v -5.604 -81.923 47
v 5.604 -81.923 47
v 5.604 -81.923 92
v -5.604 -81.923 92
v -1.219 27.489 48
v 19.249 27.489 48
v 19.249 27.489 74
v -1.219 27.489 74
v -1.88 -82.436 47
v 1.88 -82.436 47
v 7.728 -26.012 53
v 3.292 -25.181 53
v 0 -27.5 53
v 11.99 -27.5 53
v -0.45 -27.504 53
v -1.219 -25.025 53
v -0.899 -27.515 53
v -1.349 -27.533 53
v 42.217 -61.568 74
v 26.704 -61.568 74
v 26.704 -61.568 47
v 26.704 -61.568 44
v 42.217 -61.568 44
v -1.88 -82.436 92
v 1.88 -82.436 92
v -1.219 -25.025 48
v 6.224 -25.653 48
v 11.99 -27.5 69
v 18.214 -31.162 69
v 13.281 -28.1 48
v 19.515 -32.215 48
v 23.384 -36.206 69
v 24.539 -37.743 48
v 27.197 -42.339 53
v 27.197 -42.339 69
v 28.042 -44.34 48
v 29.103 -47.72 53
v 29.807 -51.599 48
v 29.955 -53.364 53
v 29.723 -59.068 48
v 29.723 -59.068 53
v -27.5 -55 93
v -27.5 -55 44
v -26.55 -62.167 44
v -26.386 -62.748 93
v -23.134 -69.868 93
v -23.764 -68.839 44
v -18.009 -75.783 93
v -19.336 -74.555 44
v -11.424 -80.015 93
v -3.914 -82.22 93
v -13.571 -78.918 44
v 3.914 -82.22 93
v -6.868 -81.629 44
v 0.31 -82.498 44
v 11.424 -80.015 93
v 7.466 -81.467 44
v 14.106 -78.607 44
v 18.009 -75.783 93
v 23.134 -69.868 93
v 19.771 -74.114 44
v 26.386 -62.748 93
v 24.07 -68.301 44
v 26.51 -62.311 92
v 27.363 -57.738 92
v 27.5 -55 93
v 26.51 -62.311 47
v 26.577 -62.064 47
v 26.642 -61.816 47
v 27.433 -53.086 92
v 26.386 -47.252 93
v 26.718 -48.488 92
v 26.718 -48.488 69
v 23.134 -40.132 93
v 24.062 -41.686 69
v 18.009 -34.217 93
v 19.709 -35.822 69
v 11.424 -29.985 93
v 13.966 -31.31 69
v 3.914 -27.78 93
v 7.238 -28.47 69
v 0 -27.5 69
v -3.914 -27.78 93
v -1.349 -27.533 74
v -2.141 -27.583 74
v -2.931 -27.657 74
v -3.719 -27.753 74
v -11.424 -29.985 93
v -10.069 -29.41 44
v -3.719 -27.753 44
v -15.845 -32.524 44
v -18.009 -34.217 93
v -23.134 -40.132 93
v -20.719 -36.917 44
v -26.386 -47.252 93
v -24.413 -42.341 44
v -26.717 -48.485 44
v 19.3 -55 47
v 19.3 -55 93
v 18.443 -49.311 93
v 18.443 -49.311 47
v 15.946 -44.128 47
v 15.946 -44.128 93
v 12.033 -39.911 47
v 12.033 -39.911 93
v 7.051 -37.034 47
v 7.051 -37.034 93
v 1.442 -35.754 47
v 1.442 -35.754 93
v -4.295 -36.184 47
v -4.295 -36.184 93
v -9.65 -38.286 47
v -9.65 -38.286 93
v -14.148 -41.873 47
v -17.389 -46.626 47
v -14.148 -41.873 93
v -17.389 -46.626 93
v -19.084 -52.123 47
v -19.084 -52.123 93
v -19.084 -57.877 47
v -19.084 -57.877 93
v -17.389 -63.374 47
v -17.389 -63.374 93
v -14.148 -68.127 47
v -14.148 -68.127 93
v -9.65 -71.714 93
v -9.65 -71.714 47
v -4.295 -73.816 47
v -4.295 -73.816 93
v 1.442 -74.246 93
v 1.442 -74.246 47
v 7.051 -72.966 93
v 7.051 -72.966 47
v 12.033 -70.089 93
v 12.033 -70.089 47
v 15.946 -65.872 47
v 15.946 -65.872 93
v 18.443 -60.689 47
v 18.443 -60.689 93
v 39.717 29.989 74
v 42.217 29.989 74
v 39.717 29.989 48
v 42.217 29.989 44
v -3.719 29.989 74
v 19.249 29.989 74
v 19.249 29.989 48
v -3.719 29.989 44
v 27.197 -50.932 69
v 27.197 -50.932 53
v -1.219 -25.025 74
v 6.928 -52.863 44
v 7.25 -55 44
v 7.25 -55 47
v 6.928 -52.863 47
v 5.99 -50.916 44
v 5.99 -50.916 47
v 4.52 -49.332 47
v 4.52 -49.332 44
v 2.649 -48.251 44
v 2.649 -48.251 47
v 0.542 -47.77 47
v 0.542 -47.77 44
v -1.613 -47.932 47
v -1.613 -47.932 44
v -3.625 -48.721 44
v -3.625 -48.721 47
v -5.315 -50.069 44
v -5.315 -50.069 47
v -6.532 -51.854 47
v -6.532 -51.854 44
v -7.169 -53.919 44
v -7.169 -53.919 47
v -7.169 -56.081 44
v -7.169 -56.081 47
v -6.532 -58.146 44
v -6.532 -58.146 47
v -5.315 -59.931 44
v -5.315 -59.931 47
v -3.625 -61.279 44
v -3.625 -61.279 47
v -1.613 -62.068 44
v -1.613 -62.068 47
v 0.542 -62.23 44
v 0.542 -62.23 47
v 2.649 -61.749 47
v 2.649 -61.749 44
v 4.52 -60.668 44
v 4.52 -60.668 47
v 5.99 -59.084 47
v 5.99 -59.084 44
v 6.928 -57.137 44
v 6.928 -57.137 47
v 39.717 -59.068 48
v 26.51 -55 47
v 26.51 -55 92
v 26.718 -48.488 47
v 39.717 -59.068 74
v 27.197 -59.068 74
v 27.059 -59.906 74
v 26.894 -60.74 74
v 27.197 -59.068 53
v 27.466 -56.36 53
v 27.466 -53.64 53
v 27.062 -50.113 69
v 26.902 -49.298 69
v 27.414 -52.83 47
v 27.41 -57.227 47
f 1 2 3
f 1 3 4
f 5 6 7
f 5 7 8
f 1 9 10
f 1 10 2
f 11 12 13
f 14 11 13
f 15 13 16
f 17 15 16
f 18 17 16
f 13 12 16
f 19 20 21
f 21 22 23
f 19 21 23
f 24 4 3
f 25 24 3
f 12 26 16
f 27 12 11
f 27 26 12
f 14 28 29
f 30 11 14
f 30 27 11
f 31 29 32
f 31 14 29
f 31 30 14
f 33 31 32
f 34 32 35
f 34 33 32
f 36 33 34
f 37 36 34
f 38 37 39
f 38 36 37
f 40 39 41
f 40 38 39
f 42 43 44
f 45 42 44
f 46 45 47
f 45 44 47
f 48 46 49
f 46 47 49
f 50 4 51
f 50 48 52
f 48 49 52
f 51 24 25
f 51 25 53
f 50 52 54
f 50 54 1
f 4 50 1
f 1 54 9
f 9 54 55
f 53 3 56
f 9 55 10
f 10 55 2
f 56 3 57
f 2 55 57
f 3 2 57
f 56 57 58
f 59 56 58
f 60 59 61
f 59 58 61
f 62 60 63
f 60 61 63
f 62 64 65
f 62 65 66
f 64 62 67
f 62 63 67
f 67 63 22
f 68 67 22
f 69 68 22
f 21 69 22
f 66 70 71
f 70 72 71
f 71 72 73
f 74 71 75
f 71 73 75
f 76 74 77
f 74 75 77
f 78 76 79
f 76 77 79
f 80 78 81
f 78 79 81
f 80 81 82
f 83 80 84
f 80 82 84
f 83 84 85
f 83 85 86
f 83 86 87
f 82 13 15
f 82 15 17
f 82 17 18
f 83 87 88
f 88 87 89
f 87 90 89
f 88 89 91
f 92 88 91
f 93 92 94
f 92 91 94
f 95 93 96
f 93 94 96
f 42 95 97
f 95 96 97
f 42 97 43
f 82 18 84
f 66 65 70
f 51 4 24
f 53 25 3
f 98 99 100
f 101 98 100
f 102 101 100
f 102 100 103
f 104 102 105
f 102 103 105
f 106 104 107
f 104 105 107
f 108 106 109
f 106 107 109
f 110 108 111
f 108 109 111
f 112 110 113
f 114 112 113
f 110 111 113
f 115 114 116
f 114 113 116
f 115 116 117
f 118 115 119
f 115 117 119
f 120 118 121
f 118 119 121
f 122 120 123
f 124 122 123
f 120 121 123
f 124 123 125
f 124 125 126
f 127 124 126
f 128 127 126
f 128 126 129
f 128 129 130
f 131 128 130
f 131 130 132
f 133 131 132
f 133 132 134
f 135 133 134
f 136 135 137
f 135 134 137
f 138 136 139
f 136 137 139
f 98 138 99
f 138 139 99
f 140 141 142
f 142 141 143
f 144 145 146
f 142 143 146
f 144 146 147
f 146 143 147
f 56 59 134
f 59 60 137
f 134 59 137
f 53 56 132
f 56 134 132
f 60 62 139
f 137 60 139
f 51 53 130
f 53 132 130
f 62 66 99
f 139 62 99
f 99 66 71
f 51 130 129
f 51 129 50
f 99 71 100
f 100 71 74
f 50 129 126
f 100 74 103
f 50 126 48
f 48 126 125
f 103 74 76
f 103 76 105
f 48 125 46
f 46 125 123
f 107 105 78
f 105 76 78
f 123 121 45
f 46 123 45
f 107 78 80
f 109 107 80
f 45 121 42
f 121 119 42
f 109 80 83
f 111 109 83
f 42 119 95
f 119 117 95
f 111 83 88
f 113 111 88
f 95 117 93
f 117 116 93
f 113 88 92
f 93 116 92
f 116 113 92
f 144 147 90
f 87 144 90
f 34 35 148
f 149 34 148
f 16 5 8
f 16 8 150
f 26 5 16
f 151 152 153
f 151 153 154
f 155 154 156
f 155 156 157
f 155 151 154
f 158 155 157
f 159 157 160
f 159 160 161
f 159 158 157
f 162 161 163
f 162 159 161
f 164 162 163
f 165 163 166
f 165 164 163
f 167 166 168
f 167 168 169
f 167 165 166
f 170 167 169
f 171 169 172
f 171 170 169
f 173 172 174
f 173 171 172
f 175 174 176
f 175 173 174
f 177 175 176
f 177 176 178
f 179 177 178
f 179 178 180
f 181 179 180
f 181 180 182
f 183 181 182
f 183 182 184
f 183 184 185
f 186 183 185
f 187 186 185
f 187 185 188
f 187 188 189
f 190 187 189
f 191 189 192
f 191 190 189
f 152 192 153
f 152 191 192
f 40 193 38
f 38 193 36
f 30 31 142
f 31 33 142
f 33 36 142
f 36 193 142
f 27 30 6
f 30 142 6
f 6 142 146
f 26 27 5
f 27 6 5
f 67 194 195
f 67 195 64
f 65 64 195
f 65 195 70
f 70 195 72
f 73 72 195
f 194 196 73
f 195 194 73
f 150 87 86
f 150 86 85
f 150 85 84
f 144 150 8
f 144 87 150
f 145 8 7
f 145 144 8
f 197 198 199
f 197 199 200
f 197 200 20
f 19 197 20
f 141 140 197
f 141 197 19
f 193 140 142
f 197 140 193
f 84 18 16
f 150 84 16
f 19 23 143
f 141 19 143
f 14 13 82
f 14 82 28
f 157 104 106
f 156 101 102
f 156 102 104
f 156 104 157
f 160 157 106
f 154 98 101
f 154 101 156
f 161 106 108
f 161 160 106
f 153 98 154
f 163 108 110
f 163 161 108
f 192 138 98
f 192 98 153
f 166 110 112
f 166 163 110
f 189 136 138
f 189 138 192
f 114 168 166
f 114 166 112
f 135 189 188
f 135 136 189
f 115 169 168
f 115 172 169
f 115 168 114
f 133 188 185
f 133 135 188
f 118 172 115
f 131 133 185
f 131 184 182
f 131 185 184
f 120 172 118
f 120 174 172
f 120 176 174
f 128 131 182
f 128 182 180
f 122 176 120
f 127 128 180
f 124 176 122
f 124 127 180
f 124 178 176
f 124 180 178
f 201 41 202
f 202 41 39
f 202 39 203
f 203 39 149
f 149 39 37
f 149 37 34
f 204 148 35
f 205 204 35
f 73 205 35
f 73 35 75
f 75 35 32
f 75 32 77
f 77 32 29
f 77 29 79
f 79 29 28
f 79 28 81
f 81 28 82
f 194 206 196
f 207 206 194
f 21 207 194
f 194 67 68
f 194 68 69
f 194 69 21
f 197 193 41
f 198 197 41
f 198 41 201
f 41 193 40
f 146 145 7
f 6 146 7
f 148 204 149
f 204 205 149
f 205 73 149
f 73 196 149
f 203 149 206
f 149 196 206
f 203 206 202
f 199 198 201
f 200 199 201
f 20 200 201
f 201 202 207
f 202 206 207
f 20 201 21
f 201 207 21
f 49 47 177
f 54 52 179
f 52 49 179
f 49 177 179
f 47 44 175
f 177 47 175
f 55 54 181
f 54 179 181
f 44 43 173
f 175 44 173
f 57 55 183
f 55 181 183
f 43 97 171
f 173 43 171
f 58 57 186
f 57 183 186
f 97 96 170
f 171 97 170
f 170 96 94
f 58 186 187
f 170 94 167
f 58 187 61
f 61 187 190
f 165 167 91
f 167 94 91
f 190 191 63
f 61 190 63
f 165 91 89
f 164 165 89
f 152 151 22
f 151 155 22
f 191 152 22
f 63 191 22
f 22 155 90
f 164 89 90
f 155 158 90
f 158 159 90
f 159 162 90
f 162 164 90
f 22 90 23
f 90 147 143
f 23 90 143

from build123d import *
from build123d.topology import SkipClean

# Parameters (mm, degrees)
BOSS_EXTRUDE1_DEPTH     = 24
CUT_EXTRUDE1_DEPTH      = 91.21363533302491
CUT_EXTRUDE1_DEPTH_BACK = 91.21363533302491
SKETCH2_4_R             = 16.25
CUT_EXTRUDE2_DEPTH      = 3
CUT_EXTRUDE2_DEPTH_BACK = 48
SKETCH2_5_R             = 19.5
SKETCH2_5_R_2           = 16.25
CUT_EXTRUDE3_DEPTH      = 48
CUT_EXTRUDE3_DEPTH_BACK = 16
SKETCH3_W               = 8.5
SKETCH3_H               = 14.200000000000006
CUT_EXTRUDE4_DEPTH      = 40
SKETCH7_R               = 27.499999999999996
SKETCH7_R_2             = 18.9
BOSS_EXTRUDE2_DEPTH     = 1
SKETCH8_W               = 181.3602376825947
SKETCH8_H               = 155.21218123297842
CUT_EXTRUDE5_DEPTH      = 48
BOSS_EXTRUDE3_START     = 48
SKETCH9_R               = 27.499999999999996
SKETCH9_R_2             = 18.9
BOSS_EXTRUDE3_DEPTH     = 48
CUT_EXTRUDE6_DEPTH      = 48
BOSS_EXTRUDE4_DEPTH     = 4
EXTRUDE_THIN2_DEPTH     = 30
CUT_EXTRUDE8_START      = -21
CUT_EXTRUDE8_DEPTH      = 21
BOSS_EXTRUDE5_DEPTH     = 21
CUT_EXTRUDE9_DEPTH      = 21
CUT_EXTRUDE10_DEPTH     = 5
SKETCH21_R              = 27.499999999999996
SKETCH21_R_2            = 7.25
BOSS_EXTRUDE6_DEPTH     = 3
SKETCH24_W              = 354.97877750373505
SKETCH24_H              = 136.88577918663822
CUT_EXTRUDE13_DEPTH     = 109.99999999999999
SKETCH25_R              = 19.3
CUT_EXTRUDE14_DEPTH     = 46


with BuildPart() as part:
    # Sketch2 → Boss-Extrude1 (new, symmetric)
    with BuildSketch(Plane.XY):
        with BuildLine():
            ThreePointArc((-24.69493875270801, -42.900000000000006), (1.68e-15, -82.5), (24.694938752708016, -42.9))
            ThreePointArc((24.694938752708016, -42.9), (21.124860801609124, -27.49999999999999), (24.694938752708012, -12.099999999999996))
            ThreePointArc((24.694938752708012, -12.099999999999996), (3.42e-15, 27.499999999999996), (-24.694938752708012, -12.100000000000001))
            ThreePointArc((-24.694938752708012, -12.100000000000001), (-21.124860801609117, -27.500000000000004), (-24.69493875270801, -42.900000000000006))
        make_face()
    extrude(amount=BOSS_EXTRUDE1_DEPTH, both=True)

    # Sketch2<4> → Cut-Extrude1 (cut, two sides: drawn at the far end of the back side and taken through both)
    with BuildSketch(Plane.XY.offset(-CUT_EXTRUDE1_DEPTH_BACK)):
        with Locations((6.74e-15, -55)):
            Circle(SKETCH2_4_R)
    extrude(amount=CUT_EXTRUDE1_DEPTH + CUT_EXTRUDE1_DEPTH_BACK, mode=Mode.SUBTRACT)

    # Sketch2<5> → Cut-Extrude2 (cut, two sides: drawn at the far end of the back side and taken through both)
    with BuildSketch(Plane.XY.offset(-CUT_EXTRUDE2_DEPTH_BACK)):
        with Locations((6.74e-15, -55)):
            Circle(SKETCH2_5_R)
        with Locations((6.74e-15, -55)):
            Circle(SKETCH2_5_R_2, mode=Mode.SUBTRACT)
    extrude(amount=CUT_EXTRUDE2_DEPTH + CUT_EXTRUDE2_DEPTH_BACK, mode=Mode.SUBTRACT)

    # Sketch2<6> → Cut-Extrude3 (cut, two sides: drawn at the far end of the back side and taken through both)
    with BuildSketch(Plane.XY.offset(-CUT_EXTRUDE3_DEPTH_BACK)):
        Polygon((10.399999999999997, 20.400000000000002), (-10.400000000000002, 20.400000000000002), (-10.399999999999999, -20.399999999999995), (10.400000000000002, -20.399999999999995), align=None)
    extrude(amount=CUT_EXTRUDE3_DEPTH + CUT_EXTRUDE3_DEPTH_BACK, mode=Mode.SUBTRACT)

    # Sketch3 → Cut-Extrude4 (cut)
    with BuildSketch(Plane.XY.offset(24)):
        with Locations((0, 27.500000000000007)):
            Rectangle(SKETCH3_W, SKETCH3_H)
    extrude(amount=-CUT_EXTRUDE4_DEPTH, mode=Mode.SUBTRACT)

    # Sketch7 → Boss-Extrude2 (add)
    with BuildSketch(Plane(origin=(0, 0, -24), x_dir=(-1, 0, 0), z_dir=(0, 0, -1))):
        with Locations((-6.74e-15, -55)):
            Circle(SKETCH7_R)
        with Locations((-6.74e-15, -55)):
            Circle(SKETCH7_R_2, mode=Mode.SUBTRACT)
    extrude(amount=BOSS_EXTRUDE2_DEPTH)

    # Sketch8 → Cut-Extrude5 (cut)
    with BuildSketch(Plane.XY.offset(24)):
        with Locations((-25.06580059332441, -26.494305521168478)):
            Rectangle(SKETCH8_W, SKETCH8_H)
    extrude(amount=-CUT_EXTRUDE5_DEPTH, mode=Mode.SUBTRACT)

    # Sketch9 → Boss-Extrude3 (add)
    with SkipClean():  # the faces are left unmerged after this step: merging them gives an invalid solid
        with BuildSketch(Plane.XY.offset(-24).offset(BOSS_EXTRUDE3_START)):
            with Locations(Location((6.74e-15, -55, 0), (0, 0, 180))):
                Circle(SKETCH9_R)
            with Locations((6.74e-15, -55)):
                Circle(SKETCH9_R_2, mode=Mode.SUBTRACT)
        extrude(amount=-BOSS_EXTRUDE3_DEPTH)

    # Sketch10 → Cut-Extrude6 (cut)
    with SkipClean():  # the faces are left unmerged after this step: merging them gives an invalid solid
        with BuildSketch(Plane.XY.offset(24)):
            with BuildLine():
                Line((26.717930940571712, -48.48830542371335), (26.510281823927063, -55))
                Line((26.510281823927063, -55), (26.510281823927063, -62.311289736835946))
                ThreePointArc((26.51028182392707, -62.311289736835946), (27.25144721072622, -58.68898697761363), (27.500000000000014, -55))
                ThreePointArc((27.500000000000014, -55), (27.30378271289276, -51.72075472598662), (26.717930940571723, -48.48830542371334))
            make_face()
            with BuildLine():
                ThreePointArc((-5.604082705298323, -81.92293180603063), (6e-15, -82.5), (5.604082705298339, -81.92293180603063))
                Line((5.604082705298337, -81.92293180603063), (6.74e-15, -81.92293180603063))
                Line((7.11e-15, -81.92293180603063), (-5.604082705298323, -81.92293180603063))
            make_face()
        extrude(amount=-CUT_EXTRUDE6_DEPTH, mode=Mode.SUBTRACT)

    # Sketch11 → Boss-Extrude4 (add)
    with SkipClean():  # the faces are left unmerged after this step: merging them gives an invalid solid
        with BuildSketch(Plane.XY.offset(24)):
            with BuildLine():
                ThreePointArc((27.500000000000025, -55.00000000000003), (27.300326018506244, -58.3078995273848), (26.7042036884893, -61.56776258429582))
                Line((26.70420368848926, -61.56776258429563), (42.21724684134985, -61.56776258429563))
                Line((42.21724684134985, -61.56776258429563), (42.21724684134985, 29.98869686217629))
                Line((42.21724684134985, 29.988696862176287), (-3.7193423220770256, 29.988696862176287))
                Line((-3.719342322077025, 29.988696862176287), (-3.719342322077025, -27.7526791648939))
                ThreePointArc((-3.719342322077028, -27.7526791648939), (15.483065545848751, -32.27282064789051), (26.717930940571723, -48.488305423713314))
                ThreePointArc((26.717930940571723, -48.488305423713314), (27.303782712892772, -51.72075472598662), (27.500000000000025, -55.00000000000002))
            make_face()
        extrude(amount=-BOSS_EXTRUDE4_DEPTH)

    # Sketch16 → Extrude-Thin2 (add)
    with SkipClean():  # the faces are left unmerged after this step: merging them gives an invalid solid
        with BuildSketch(Plane(origin=(0, 0, 24), x_dir=(-1, 0, 0), z_dir=(0, 0, -1))):
            with BuildLine():
                Line((-26.704203688489347, -61.56776258429563), (-42.21724684134985, -61.56776258429563))
                Line((-42.21724684134985, -61.56776258429563), (-42.21724684134985, 29.988696862176287))
                Line((-42.21724684134985, 29.988696862176287), (3.719342322077025, 29.988696862176287))
                Line((3.719342322077025, 29.988696862176287), (3.719342322077025, -27.75267916489391))
                ThreePointArc((3.719342322077025, -27.75267916489391), (-20.443603637167037, -36.60682000505511), (-26.704203688489347, -61.56776258429563))
            make_face()
            with BuildLine():
                Line((-29.722942444479006, -59.06776258429563), (-39.71724684134985, -59.06776258429563))
                Line((-39.71724684134985, -59.06776258429563), (-39.71724684134985, 27.48869686217629))
                Line((-39.71724684134985, 27.48869686217629), (1.2193423220770256, 27.488696862176287))
                Line((1.2193423220770256, 27.488696862176287), (1.2193423220770252, -25.02479017084956))
                ThreePointArc((1.2193423220770252, -25.02479017084956), (-22.200108055370485, -34.82191281786335), (-29.722942444479006, -59.06776258429563))
            make_face(mode=Mode.SUBTRACT)
        extrude(amount=EXTRUDE_THIN2_DEPTH)

    # Sketch17 → Cut-Extrude8 (cut)
    with BuildSketch(Plane(origin=(0, 0, -5.999999999999998), x_dir=(-1, 0, 0), z_dir=(0, 0, -1)).offset(CUT_EXTRUDE8_START)):
        with BuildLine():
            Line((1.3487027041950868, -27.533092620105528), (1.2193423220770252, -25.02479017084956))
            ThreePointArc((1.2193423220770252, -25.02479017084956), (-22.20010805537015, -34.82191281786366), (-29.72294244447902, -59.06776258429561))
            Line((-29.72294244447902, -59.06776258429561), (-27.19748715520997, -59.06776258429561))
            ThreePointArc((-27.19748715520997, -59.06776258429561), (-20.387465924836167, -36.54461506324914), (1.3487027041950868, -27.533092620105528))
        make_face()
    extrude(amount=CUT_EXTRUDE8_DEPTH, mode=Mode.SUBTRACT)

    # Sketch18 → Boss-Extrude5 (add)
    with BuildSketch(Plane(origin=(0, 0, 20), x_dir=(-1, 0, 0), z_dir=(0, 0, -1))):
        with BuildLine():
            ThreePointArc((-27.19748715520984, -50.93223741570337), (-17.949742740939968, -34.16597169210712), (-1.0275e-13, -27.499999999999904))
            Line((-1.0275e-13, -27.499999999999908), (-11.98957880828152, -27.499999999999908))
            ThreePointArc((-11.98957880828161, -27.49999999999943), (-20.951294804022364, -33.528082385707165), (-27.197487155209934, -42.33916699256241))
            Line((-27.197487155209956, -42.339166992562404), (-27.197487155209956, -50.93223741570336))
        make_face()
    extrude(amount=BOSS_EXTRUDE5_DEPTH)

    # Sketch19 → Cut-Extrude9 (cut)
    with BuildSketch(Plane(origin=(0, 0, -5.999999999999998), x_dir=(-1, 0, 0), z_dir=(0, 0, -1))):
        Polygon((-39.71724684134985, 27.48869686217629), (-39.71724684134984, 29.988696862176287), (-19.248952259636408, 29.988696862176287), (-19.24895225963641, 27.48869686217629), align=None)
    extrude(amount=-CUT_EXTRUDE9_DEPTH, mode=Mode.SUBTRACT)

    # Sketch20 → Cut-Extrude10 (cut)
    with BuildSketch(Plane(origin=(0, 0, 15.000000000000004), x_dir=(-1, 0, 0), z_dir=(0, 0, -1))):
        Polygon((-19.248952259636408, 29.988696862176287), (-39.71724684134984, 29.988696862176287), (-39.71724684134984, 27.48869686217629), (-19.24895225963641, 27.48869686217629), align=None)
    extrude(amount=-CUT_EXTRUDE10_DEPTH, mode=Mode.SUBTRACT)

    # Sketch21 → Boss-Extrude6 (add)
    with BuildSketch(Plane.XY.offset(24)):
        with Locations(Location((6.74e-15, -55, 0), (0, 0, 180))):
            Circle(SKETCH21_R)
        with Locations((6.74e-15, -55)):
            Circle(SKETCH21_R_2, mode=Mode.SUBTRACT)
    extrude(amount=-BOSS_EXTRUDE6_DEPTH)


with BuildPart() as body_2:
    # Mirror1: mirrored copy
    add(part.part.mirror(Plane.XY.offset(34)))

    # Sketch25 → Cut-Extrude14 (cut)
    with BuildSketch(Plane.XY.offset(93)):
        with Locations((6.74e-15, -55)):
            Circle(SKETCH25_R)
    extrude(amount=-CUT_EXTRUDE14_DEPTH, mode=Mode.SUBTRACT)


with BuildPart() as part_1:
    add(part.part)

    # Sketch24 → Cut-Extrude13 (cut)
    with BuildSketch(Plane.XY.offset(24)):
        with Locations((-135.2721419105177, -38.45419273114281)):
            Rectangle(SKETCH24_W, SKETCH24_H)
    extrude(amount=-CUT_EXTRUDE13_DEPTH, mode=Mode.SUBTRACT)


solid = body_2.part
